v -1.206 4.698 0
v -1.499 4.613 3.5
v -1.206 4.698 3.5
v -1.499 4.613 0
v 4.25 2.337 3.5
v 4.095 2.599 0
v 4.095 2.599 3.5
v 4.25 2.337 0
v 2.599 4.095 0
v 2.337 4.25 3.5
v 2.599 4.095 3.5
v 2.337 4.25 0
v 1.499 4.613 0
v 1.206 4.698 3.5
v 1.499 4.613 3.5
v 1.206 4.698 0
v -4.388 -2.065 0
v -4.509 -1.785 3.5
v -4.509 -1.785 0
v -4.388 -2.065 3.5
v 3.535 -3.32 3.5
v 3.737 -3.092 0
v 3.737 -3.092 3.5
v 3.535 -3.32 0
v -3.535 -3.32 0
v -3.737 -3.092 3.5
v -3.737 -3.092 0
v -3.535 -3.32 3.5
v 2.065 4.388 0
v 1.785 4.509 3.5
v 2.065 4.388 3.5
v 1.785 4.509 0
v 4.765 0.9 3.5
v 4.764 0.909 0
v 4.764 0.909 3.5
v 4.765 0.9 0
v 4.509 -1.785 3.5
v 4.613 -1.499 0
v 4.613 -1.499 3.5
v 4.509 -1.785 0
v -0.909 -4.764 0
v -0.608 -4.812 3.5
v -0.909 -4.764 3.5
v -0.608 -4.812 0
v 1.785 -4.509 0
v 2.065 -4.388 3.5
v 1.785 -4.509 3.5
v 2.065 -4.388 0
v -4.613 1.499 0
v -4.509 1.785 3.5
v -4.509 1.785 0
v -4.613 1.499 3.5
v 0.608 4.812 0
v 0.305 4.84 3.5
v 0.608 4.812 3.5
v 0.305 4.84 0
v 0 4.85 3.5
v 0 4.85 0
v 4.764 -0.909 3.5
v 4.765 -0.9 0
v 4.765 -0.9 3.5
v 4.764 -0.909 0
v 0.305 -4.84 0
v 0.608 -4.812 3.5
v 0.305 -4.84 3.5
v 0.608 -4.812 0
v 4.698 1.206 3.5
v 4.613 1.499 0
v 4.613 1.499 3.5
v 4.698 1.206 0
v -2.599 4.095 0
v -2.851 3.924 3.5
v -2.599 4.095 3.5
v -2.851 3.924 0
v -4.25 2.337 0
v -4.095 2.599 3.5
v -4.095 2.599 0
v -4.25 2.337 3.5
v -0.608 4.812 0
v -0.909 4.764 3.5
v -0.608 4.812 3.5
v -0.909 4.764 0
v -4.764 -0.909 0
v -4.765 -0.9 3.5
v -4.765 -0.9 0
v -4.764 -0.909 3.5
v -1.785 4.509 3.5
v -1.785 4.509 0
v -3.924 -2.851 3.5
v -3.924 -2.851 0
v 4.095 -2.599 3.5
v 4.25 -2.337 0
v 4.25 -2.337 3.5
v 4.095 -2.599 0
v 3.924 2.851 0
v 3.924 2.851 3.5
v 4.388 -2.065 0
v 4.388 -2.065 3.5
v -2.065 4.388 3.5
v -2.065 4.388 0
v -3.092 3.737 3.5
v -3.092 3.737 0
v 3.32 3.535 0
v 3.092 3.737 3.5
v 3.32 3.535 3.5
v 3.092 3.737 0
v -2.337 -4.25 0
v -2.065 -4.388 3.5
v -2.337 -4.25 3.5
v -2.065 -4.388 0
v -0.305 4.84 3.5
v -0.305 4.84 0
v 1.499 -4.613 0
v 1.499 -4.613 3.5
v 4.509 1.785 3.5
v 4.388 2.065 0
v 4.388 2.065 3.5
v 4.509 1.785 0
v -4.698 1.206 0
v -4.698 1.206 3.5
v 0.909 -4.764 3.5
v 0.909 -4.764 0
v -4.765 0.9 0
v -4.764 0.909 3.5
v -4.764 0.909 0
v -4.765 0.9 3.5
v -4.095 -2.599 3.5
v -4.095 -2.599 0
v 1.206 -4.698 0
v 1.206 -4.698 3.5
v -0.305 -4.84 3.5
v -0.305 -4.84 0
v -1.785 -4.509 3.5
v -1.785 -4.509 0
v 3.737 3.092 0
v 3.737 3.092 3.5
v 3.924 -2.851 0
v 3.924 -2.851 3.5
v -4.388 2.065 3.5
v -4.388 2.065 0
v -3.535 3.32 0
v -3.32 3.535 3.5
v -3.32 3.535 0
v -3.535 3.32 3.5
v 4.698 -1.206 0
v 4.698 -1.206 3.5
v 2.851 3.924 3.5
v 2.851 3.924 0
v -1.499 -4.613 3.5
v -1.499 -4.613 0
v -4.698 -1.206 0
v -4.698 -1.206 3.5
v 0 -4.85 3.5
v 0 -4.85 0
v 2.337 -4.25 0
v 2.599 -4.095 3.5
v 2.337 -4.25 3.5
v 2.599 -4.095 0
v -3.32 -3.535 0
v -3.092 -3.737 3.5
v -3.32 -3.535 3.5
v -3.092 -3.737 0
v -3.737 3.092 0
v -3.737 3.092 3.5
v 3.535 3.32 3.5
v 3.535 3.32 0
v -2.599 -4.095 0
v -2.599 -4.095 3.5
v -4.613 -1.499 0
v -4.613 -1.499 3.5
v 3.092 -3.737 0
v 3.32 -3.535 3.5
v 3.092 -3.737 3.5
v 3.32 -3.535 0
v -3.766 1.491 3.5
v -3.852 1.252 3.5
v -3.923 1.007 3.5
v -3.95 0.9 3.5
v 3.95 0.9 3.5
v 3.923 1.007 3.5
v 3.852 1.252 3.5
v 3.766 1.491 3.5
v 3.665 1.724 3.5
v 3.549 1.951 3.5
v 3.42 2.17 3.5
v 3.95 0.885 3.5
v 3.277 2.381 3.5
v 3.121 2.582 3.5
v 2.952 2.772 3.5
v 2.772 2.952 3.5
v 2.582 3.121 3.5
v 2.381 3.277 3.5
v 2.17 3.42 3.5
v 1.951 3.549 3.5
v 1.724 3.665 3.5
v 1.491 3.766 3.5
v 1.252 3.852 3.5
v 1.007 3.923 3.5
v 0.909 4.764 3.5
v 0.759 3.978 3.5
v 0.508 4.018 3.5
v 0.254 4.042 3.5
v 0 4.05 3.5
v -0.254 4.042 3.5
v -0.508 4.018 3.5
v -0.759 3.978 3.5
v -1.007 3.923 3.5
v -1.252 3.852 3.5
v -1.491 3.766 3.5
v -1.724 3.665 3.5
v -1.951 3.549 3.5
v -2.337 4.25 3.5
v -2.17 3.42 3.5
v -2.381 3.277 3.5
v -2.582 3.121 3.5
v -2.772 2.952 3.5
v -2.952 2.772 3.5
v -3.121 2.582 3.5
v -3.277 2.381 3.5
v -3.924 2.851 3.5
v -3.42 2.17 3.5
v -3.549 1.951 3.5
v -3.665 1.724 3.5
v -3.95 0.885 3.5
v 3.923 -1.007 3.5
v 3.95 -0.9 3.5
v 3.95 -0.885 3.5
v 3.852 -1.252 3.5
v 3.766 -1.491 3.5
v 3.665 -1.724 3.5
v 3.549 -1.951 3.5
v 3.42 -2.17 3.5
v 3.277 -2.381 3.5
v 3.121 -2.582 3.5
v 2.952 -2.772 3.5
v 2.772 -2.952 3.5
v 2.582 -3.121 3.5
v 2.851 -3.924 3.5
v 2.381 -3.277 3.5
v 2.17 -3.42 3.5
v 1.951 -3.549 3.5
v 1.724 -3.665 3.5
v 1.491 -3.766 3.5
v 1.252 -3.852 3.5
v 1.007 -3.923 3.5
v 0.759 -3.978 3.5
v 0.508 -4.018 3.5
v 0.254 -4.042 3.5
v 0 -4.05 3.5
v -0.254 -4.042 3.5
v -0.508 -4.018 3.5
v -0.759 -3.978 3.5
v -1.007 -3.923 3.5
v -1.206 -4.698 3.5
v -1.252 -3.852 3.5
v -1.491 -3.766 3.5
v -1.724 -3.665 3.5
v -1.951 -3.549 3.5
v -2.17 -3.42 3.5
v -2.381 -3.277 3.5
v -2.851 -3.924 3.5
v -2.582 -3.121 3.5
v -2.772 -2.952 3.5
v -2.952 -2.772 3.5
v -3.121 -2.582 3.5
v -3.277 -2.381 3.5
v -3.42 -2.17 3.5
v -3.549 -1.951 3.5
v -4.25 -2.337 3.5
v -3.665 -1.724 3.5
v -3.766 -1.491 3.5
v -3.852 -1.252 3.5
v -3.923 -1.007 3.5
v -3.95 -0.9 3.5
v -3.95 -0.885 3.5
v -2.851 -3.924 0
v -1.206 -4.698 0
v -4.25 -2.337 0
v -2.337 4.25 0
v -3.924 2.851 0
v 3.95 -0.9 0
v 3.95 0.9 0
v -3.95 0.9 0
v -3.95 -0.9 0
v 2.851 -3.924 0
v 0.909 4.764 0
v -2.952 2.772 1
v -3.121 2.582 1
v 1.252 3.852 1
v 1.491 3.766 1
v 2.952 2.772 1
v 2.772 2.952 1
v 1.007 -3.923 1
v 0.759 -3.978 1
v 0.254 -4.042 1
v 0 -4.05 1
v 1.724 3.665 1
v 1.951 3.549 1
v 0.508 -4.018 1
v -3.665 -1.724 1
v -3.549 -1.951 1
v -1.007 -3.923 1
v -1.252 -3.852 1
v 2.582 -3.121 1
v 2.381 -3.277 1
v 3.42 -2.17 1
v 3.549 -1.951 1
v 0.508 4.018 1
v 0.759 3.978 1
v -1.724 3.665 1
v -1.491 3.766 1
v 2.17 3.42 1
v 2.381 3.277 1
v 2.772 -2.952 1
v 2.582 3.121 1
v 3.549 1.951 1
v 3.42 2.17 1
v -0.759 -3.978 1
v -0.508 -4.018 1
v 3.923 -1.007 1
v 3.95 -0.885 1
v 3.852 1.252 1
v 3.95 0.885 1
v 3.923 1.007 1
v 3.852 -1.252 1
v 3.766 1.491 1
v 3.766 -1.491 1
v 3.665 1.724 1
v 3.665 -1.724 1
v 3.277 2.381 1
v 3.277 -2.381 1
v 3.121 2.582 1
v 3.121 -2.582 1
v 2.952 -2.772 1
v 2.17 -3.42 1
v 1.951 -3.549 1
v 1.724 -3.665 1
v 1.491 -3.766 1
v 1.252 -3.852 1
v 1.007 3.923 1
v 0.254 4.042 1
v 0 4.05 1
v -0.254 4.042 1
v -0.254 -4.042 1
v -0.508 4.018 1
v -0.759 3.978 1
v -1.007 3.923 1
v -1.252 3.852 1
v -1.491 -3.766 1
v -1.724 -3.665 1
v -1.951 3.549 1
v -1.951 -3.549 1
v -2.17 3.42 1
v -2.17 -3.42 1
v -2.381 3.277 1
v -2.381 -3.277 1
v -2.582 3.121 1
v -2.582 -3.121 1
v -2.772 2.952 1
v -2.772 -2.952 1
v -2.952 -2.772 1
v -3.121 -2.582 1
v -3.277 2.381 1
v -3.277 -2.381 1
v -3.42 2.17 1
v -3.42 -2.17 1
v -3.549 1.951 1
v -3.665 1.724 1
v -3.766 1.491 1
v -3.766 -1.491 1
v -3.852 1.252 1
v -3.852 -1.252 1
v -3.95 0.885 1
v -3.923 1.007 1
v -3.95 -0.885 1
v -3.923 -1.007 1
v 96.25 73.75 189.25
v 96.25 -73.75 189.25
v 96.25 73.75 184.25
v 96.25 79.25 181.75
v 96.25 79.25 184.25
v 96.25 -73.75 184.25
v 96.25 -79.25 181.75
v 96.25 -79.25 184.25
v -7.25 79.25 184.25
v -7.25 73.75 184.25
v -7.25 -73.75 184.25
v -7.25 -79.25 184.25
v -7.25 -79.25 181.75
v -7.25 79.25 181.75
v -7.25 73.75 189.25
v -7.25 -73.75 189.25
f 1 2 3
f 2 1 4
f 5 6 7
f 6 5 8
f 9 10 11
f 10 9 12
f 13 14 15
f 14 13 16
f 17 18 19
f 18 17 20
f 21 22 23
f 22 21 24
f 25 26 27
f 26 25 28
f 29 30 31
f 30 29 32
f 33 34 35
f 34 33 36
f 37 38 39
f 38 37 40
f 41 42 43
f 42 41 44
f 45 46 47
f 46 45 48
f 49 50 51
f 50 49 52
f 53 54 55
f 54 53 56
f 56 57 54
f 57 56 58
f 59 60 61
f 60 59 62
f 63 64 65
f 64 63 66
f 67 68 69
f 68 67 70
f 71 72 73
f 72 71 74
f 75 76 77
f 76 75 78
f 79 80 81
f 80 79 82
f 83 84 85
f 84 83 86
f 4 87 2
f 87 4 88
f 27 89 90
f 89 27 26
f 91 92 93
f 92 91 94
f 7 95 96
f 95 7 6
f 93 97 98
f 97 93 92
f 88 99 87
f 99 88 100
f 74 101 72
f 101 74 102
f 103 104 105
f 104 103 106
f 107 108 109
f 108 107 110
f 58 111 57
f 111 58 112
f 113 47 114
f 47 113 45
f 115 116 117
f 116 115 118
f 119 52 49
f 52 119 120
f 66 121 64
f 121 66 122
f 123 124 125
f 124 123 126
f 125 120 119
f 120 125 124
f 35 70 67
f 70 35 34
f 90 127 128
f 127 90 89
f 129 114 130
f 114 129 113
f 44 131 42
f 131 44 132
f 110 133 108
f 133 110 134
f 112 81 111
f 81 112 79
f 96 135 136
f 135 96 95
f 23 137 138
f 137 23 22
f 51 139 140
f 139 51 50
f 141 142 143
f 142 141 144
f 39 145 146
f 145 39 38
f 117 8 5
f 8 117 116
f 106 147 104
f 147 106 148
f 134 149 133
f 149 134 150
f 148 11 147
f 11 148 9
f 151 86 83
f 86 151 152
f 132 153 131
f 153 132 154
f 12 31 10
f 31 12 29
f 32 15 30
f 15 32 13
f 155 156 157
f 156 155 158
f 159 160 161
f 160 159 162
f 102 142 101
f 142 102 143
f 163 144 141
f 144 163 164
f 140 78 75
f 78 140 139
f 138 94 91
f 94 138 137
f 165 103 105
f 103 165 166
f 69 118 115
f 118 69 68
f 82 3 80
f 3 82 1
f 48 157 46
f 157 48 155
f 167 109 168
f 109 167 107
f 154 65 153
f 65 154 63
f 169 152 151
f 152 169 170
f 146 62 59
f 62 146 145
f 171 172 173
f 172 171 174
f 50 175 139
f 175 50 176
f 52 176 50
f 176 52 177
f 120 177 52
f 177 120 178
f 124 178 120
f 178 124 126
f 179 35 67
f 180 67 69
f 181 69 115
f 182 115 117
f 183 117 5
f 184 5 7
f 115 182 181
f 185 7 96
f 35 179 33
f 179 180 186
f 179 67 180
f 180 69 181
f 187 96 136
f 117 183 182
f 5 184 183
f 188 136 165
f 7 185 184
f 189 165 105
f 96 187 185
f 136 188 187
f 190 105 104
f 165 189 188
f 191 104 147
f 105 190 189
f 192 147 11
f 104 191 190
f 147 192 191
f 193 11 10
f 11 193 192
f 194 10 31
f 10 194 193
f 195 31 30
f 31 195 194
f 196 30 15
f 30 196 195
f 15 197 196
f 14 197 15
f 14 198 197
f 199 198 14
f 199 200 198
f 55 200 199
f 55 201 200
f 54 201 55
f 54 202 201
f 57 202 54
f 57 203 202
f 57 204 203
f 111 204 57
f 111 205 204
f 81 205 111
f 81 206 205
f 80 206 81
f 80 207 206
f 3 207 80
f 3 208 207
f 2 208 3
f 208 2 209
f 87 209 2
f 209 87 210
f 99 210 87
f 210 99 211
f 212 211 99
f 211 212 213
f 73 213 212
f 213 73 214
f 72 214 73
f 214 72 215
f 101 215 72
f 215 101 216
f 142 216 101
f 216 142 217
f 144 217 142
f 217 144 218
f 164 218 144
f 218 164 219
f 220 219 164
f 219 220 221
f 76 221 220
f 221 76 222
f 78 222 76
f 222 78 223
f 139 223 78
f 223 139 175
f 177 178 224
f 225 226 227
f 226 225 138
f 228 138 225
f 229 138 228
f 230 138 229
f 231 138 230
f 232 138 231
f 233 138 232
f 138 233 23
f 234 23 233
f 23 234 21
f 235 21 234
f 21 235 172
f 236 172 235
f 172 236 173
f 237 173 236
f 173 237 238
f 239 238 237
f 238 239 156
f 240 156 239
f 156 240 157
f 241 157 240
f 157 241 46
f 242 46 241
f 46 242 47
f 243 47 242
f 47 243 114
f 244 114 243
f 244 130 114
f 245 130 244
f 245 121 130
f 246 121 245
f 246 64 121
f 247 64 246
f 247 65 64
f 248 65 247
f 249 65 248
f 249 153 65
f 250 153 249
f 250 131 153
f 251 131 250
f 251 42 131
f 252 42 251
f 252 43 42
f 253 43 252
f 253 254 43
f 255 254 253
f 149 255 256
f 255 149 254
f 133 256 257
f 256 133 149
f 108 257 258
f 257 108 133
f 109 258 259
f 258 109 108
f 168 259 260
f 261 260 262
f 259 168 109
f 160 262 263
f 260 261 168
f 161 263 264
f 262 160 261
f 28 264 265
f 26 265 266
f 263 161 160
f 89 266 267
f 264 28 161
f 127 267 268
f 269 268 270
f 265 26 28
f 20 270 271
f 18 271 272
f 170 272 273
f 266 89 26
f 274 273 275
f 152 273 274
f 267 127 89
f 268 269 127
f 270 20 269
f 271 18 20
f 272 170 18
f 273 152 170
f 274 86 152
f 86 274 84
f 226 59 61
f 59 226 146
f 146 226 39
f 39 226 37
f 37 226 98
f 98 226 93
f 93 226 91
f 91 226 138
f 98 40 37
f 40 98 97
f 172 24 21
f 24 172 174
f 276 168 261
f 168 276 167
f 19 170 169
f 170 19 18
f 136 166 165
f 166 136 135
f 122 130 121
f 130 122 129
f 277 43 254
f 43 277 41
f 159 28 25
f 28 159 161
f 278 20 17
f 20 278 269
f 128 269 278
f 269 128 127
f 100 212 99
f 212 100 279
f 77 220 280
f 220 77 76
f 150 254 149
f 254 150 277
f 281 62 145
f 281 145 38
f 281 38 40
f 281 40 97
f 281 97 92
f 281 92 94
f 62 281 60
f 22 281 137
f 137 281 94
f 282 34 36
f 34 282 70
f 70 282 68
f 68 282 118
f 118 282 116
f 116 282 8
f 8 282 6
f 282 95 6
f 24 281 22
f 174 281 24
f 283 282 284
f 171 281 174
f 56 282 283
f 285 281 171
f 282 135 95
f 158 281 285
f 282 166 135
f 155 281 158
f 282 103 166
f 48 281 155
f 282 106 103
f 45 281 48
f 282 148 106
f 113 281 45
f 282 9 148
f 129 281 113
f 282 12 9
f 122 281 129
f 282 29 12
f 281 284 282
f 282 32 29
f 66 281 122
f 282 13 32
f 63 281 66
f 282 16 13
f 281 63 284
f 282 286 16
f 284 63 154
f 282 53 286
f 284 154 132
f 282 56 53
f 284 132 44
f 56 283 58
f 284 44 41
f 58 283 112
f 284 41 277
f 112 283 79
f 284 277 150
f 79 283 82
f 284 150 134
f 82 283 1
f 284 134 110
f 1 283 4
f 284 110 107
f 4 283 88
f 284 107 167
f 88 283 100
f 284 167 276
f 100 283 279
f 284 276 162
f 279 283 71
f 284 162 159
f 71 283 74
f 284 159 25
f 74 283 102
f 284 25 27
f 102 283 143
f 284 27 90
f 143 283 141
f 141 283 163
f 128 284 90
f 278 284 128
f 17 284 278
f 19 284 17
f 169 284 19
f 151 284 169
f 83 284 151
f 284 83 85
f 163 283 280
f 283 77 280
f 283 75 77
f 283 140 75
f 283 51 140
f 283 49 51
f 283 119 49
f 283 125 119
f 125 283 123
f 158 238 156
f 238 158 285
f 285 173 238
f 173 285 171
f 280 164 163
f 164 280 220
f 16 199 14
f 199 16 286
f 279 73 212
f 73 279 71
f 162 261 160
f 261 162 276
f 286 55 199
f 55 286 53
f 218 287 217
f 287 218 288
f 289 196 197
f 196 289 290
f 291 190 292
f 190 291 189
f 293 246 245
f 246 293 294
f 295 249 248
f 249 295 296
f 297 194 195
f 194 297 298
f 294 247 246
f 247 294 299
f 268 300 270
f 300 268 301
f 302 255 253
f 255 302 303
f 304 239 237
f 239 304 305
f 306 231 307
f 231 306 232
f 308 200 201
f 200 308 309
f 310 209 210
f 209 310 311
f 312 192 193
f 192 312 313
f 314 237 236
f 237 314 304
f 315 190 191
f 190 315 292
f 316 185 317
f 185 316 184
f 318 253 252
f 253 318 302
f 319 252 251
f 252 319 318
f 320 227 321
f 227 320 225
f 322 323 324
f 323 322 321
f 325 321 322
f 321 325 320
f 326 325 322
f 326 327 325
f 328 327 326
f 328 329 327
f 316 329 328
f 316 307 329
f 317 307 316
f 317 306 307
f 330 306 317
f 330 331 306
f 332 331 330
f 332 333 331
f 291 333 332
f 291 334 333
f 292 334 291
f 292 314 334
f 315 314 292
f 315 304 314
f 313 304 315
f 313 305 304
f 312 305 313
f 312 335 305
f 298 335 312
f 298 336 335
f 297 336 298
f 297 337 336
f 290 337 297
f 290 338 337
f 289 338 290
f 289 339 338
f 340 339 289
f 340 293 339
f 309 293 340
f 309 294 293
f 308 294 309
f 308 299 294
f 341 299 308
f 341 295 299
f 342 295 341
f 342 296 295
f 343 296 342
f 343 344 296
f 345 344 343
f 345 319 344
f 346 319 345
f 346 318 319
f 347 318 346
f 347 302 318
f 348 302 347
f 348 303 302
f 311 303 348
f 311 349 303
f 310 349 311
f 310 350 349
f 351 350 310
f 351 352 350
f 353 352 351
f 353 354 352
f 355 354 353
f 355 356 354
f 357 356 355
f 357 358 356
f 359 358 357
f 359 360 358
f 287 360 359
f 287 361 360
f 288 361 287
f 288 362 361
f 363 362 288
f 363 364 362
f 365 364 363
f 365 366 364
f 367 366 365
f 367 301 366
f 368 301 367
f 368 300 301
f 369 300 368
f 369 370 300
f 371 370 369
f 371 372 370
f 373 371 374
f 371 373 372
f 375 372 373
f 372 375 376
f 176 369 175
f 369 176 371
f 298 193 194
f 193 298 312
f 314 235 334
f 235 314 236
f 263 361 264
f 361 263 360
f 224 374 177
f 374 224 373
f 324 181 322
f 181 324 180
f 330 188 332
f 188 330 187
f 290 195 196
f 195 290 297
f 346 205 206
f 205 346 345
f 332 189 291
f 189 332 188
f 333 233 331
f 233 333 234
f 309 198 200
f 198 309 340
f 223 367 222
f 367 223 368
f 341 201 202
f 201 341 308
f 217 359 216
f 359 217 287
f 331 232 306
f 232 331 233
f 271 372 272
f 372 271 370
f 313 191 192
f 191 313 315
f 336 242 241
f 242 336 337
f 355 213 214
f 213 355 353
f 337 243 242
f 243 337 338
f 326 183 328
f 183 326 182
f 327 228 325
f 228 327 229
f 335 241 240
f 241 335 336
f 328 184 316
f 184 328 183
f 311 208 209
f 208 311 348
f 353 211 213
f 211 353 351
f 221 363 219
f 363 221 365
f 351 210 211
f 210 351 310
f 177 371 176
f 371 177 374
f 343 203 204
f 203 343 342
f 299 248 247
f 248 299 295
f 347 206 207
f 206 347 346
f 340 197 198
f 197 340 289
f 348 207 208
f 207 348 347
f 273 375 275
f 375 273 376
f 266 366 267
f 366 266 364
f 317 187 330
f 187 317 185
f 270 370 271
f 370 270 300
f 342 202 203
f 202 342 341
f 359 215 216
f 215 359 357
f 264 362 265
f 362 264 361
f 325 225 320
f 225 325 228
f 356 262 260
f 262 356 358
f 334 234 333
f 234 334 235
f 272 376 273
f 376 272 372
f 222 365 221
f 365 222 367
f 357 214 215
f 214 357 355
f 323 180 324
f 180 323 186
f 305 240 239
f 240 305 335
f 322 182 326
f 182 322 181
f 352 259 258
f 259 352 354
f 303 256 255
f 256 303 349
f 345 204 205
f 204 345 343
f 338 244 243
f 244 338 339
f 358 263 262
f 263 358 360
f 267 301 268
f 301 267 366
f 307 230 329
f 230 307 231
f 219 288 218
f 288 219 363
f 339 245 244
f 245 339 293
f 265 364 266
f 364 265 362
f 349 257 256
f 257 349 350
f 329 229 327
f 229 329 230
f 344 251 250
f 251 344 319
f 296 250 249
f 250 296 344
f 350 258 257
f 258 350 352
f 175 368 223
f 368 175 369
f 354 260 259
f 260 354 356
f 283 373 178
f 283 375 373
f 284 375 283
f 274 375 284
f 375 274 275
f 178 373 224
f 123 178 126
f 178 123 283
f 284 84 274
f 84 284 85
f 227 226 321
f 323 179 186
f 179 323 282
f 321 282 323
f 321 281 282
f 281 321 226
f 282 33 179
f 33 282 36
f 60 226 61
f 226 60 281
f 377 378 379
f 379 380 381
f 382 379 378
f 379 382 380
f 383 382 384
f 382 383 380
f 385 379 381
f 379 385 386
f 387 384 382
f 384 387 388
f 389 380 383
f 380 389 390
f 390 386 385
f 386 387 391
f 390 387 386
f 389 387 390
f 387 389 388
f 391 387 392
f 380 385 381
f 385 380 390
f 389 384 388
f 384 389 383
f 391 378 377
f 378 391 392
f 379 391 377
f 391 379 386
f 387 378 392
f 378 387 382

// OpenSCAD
include <reinforcements.scad>


z_size = top_cover_z-top_cover_plate_z;
lid_cover_zsize1 = 6;
lid_cover_zsize2 = 2;
lid_switch_x = 20;
lid_switch_y = 45;
tpe_press_base_z = 2.5;
tpe_press_z = 5+tpe_press_base_z;

uvp_w = space_uv_w + bb_size-1;

module uv_lid() {
    difference() {
		translate([space_ec_w/2+bb_size, 0, ]) difference() {
			cube(size=[uvp_w, total_h, z_size], center=true);

			translate([bb_size/-2, 0, 0]) cube(size=[uvp_w-bb_size-2*rf_xsize, total_h-2*bb_size-2*rf_xsize, z_size+2], center=true);
			translate([bb_size/-2, 0, cover_frame_size]) cube(size=[uvp_w-bb_size-2*rf_xsize, total_h-2*bb_size, z_size], center=true);

			// top cover mount holes
	        translate([uvp_w/-2+bb_size, total_h/-2+bb_size/2, 0]) cylinder(d=4, h=z_size, $fn=16);
	        translate([uvp_w/2-bb_size, total_h/-2+bb_size/2, 0]) cylinder(d=4, h=z_size, $fn=16);
	        translate([uvp_w/-2+bb_size, total_h/2-bb_size/2, 0]) cylinder(d=4, h=z_size, $fn=16);
	        translate([uvp_w/2-bb_size, total_h/2-bb_size/2, 0]) cylinder(d=4, h=z_size, $fn=16);
	        translate([0, total_h/2-bb_size/2, 0]) cylinder(d=4, h=z_size, $fn=16);
	        translate([0, total_h/-2+bb_size/2, 0]) cylinder(d=4, h=z_size, $fn=16);
	
		}
			hinge_w = 2*mh_pitch+2;
			hinge_lower = 6;
			hinge_higher = 12;

			// left hinge	      
	        translate([total_w/-2+hinge_w/2+(8.2+0.5)*mh_pitch+mh_out_dia/2-0.5, total_h/2-bb_size/2, z_size/-2+(hinge_lower+1)/2-1]) cube(size=[hinge_w, bb_size+2, hinge_lower+1], center=true);
	        translate([total_w/-2+hinge_w/2+(8.2+0.5)*mh_pitch+mh_out_dia/2-0.5, total_h/2+bb_size/2-bb_size/3, z_size/-2+(hinge_higher+1)/2-1]) cube(size=[hinge_w, bb_size, hinge_higher+1], center=true);
	        translate([total_w/-2+9.2*mh_pitch+mh_out_dia/2, total_h/2-bb_size/2-bb_size/4+1, z_size/-2 -1]) cylinder(d=4, h=z_size+2, $fn=16);
	        translate([total_w/-2+10.2*mh_pitch+mh_out_dia/2, total_h/2-bb_size/2-bb_size/4+1, z_size/-2 -1]) cylinder(d=4, h=z_size+2, $fn=16);
	        // right hinge
	        translate([total_w/-2+hinge_w/2+(16.5+0.5)*mh_pitch+mh_out_dia/2-0.5, total_h/2-bb_size/2, z_size/-2+(hinge_lower+1)/2-1]) cube(size=[hinge_w, bb_size+2, hinge_lower+1], center=true);
	        translate([total_w/-2+hinge_w/2+(16.5+0.5)*mh_pitch+mh_out_dia/2-0.5, total_h/2+bb_size/2-bb_size/3, z_size/-2+(hinge_higher+1)/2-1]) cube(size=[hinge_w, bb_size, hinge_higher+1], center=true);
	        translate([total_w/-2+17.5*mh_pitch+mh_out_dia/2, total_h/2-bb_size/2-bb_size/4+1, z_size/-2 -1]) cylinder(d=4, h=z_size+2, $fn=16);
	        translate([total_w/-2+18.5*mh_pitch+mh_out_dia/2, total_h/2-bb_size/2-bb_size/4+1, z_size/-2 -1]) cylinder(d=4, h=z_size+2, $fn=16);

	}


}

module uv_lid_cover(part=1) {
	difference() {
		union() {
			cube(size=[uvp_w, total_h, lid_cover_zsize1], center=true);
			translate([lid_switch_x/-2, total_h/-2+lid_switch_y/2+42, lid_cover_zsize1/2 - lid_cover_zsize2/2]) cube(size=[uvp_w+lid_switch_x, lid_switch_y, lid_cover_zsize2], center=true);

		}
			translate([uvp_w/-2+bb_size, total_h/-2+bb_size/2, lid_cover_zsize1/2-3]) screw_trap();
			translate([uvp_w/2-bb_size, total_h/-2+bb_size/2, lid_cover_zsize1/2-3]) screw_trap();
			translate([uvp_w/-2+bb_size, total_h/2-bb_size/2, lid_cover_zsize1/2-3]) screw_trap();
			translate([uvp_w/2-bb_size, total_h/2-bb_size/2, lid_cover_zsize1/2-3]) screw_trap();
			translate([0, total_h/2-bb_size/2, lid_cover_zsize1/2-3]) screw_trap();
			translate([0, total_h/-2+bb_size/2, lid_cover_zsize1/2-3]) screw_trap();

			if(part==1) {
				translate([uvp_w/2+7, 0, 0]) cube(size=[uvp_w, total_h+2, lid_cover_zsize1+2], center=true);
				translate([uvp_w/2-7, 0, 1.5]) cube(size=[uvp_w, total_h+2, lid_cover_zsize1], center=true);

			}
			else {
				translate([uvp_w/-2-7, 0, 0]) cube(size=[uvp_w, total_h+2, lid_cover_zsize1+2], center=true);
				translate([uvp_w/-2+7, 0, -lid_cover_zsize1+1.5]) cube(size=[uvp_w, total_h+2, lid_cover_zsize1], center=true);
			}

	}
}

module screw_trap() {
	cylinder(d=6.5, h=3+1, $fn=100);
	translate([0, 0, -10.3]) cylinder(d=3.6, h=10, $fn=100);
}

module tpe_press() {
	cube(size=[(uvp_w-bb_size-2*rf_xsize-2)/2, total_h-2*bb_size-1.5, tpe_press_base_z], center=true);
	translate([0, 0, tpe_press_z/2 - tpe_press_base_z/2]) cube(size=[(uvp_w-bb_size-2*rf_xsize-2)/2, total_h-2*bb_size-2.5-2*rf_xsize, tpe_press_z], center=true);

}

//translate([0, 0, total_z-bb_size/2-z_size/2-top_cover_plate_z+10]) uv_lid();
//translate([space_ec_w/2+bb_size, 0, total_z-bb_size/2-z_size/2-top_cover_plate_z+50]) uv_lid_cover(part=1);
translate([space_ec_w/2+bb_size-8, 0, total_z-bb_size/2-z_size/2-top_cover_plate_z+40]) tpe_press();
